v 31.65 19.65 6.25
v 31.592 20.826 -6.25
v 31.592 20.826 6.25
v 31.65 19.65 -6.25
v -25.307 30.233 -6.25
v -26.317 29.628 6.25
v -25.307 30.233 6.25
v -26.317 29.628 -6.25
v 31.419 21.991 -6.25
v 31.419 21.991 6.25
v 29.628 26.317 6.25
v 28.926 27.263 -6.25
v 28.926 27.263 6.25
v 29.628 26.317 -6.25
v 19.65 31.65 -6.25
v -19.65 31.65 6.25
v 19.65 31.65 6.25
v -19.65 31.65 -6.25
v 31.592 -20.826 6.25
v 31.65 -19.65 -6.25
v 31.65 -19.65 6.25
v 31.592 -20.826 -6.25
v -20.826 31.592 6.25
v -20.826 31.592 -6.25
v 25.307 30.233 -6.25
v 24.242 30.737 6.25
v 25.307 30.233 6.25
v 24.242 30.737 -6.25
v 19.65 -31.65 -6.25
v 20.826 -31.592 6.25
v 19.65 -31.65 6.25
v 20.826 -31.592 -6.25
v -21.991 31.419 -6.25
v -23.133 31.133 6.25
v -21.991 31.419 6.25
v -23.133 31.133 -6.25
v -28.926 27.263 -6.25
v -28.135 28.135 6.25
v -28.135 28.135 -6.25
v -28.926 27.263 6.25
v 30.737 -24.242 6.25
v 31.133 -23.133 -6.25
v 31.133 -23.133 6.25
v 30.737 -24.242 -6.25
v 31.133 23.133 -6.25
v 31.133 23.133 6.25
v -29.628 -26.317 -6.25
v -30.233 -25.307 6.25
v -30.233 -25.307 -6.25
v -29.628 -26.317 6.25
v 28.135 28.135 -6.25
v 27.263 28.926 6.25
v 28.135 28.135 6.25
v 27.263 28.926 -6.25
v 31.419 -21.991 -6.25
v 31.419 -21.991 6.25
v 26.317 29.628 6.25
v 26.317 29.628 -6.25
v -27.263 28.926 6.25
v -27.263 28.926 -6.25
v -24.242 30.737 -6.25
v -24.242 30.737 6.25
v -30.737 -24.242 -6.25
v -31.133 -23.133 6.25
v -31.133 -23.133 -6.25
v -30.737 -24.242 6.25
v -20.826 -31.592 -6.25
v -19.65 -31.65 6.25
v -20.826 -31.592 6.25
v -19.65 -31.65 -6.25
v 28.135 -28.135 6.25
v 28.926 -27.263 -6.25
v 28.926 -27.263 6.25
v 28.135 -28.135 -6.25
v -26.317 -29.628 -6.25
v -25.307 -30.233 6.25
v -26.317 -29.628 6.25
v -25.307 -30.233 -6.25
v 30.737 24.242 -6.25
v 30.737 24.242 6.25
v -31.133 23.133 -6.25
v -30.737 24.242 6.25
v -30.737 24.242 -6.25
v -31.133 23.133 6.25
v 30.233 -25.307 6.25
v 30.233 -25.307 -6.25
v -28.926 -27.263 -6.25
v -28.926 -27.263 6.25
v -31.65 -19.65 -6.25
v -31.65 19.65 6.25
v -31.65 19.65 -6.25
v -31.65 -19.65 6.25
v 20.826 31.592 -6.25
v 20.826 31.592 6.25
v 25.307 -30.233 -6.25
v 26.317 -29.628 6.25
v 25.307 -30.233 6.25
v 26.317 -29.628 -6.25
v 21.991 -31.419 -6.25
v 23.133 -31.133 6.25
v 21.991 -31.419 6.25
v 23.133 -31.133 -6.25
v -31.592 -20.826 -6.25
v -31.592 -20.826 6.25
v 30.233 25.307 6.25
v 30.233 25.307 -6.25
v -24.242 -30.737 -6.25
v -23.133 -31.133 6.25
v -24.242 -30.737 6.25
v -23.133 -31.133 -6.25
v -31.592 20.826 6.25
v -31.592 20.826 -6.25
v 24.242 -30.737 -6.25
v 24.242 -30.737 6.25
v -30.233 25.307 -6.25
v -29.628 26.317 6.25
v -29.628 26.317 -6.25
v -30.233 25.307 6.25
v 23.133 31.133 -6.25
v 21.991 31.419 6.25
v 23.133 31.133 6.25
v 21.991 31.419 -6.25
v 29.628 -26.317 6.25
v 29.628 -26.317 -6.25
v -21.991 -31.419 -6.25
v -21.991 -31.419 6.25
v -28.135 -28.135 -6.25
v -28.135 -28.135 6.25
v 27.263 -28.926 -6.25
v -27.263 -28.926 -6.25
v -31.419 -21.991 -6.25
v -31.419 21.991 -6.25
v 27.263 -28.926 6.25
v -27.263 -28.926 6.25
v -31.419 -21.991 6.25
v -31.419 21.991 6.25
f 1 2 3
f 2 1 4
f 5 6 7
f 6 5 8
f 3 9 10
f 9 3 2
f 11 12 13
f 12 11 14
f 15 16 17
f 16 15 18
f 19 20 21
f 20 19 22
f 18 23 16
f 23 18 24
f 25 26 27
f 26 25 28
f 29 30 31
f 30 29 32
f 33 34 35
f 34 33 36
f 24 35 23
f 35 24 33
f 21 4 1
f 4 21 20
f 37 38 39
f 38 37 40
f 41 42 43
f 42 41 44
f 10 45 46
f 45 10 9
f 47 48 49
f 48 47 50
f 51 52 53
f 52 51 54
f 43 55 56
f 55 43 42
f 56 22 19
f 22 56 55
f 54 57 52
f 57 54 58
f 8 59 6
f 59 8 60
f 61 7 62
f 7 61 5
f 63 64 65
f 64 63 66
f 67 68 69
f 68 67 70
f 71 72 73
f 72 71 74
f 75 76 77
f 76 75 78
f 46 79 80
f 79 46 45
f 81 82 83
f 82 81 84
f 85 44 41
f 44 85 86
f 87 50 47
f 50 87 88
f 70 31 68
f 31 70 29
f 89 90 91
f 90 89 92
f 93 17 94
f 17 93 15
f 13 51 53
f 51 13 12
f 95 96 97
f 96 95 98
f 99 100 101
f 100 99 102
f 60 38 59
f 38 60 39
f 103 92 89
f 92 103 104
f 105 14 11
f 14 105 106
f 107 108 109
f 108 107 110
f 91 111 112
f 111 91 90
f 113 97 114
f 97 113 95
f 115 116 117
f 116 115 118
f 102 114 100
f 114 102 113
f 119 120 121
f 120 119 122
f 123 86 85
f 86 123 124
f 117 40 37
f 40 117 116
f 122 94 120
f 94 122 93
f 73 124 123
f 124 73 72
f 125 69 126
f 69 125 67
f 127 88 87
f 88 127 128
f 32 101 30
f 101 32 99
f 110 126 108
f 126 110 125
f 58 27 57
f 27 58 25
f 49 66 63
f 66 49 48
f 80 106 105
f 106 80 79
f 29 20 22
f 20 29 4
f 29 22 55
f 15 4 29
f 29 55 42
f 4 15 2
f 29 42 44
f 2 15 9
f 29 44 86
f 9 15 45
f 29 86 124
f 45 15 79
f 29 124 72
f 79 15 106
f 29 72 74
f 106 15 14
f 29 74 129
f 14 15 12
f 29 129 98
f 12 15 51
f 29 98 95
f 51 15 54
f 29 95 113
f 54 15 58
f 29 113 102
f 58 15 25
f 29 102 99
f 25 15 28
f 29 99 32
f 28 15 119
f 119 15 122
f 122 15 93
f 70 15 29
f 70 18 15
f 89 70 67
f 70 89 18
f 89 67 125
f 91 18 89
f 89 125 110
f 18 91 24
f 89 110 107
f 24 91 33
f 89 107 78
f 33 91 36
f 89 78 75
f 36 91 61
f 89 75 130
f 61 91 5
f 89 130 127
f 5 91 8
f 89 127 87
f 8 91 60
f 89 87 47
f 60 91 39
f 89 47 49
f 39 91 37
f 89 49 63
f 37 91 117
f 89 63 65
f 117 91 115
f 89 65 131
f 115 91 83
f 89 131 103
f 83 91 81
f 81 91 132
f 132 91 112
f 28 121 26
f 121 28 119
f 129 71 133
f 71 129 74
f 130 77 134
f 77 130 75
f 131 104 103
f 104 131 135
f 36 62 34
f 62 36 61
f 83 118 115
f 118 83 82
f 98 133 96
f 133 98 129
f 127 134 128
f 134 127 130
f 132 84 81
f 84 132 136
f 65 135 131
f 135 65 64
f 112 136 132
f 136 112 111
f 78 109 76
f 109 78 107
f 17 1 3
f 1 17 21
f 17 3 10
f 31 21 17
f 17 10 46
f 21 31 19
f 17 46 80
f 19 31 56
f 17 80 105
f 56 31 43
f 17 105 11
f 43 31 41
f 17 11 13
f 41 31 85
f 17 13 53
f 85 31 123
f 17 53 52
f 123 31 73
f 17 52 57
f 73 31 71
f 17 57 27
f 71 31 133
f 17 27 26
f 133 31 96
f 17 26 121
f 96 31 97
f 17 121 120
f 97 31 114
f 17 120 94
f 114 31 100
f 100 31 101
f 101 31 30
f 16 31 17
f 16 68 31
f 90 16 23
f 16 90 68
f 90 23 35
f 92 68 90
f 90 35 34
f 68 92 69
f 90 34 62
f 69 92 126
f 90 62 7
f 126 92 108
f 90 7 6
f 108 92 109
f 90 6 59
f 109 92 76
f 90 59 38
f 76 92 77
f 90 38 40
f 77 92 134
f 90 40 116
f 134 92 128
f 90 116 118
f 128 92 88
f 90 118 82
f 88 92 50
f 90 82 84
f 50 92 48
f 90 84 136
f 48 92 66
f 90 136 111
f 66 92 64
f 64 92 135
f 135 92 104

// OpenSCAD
// GenericHolder1.0
// 
// A simple, generic insert for blocky things
// that are to fit inside other blocky things.
// 
// BrickHolder1 can do most of what this does, and more.
// Use that if you want TOGridPile-shaped blocks or something.

description = "";
size_atoms = [5, 5, 1];
atom_pitch = 12.7; // 0.001
cavity_size = [0, 0]; // 0.1
bottom_hole_size = [0,0]; // 0.2
floor_thickness = 3.2; // 0.1
front_slot_width = 0; // 0.1
outer_offset = -0.1;
$fn = 64;

use <../lib/TOGridLib3.scad>
use <../lib/TOGMod1.scad>
use <../lib/TOGPath1.scad>
use <../lib/TOGPolyhedronLib1.scad>
use <../lib/TOGArrayLib1.scad>
use <../lib/TOGVecLib0.scad>

size = [for(s=size_atoms) s * atom_pitch + outer_offset*2];

function brickholder2insert_volume( vec ) = tal1_reduce(1, vec, function(a,b) a*b);

togmod1_domodule(
let(height = size[2])
let(z_mid = 0)
let(crad = min(12, max((size[0]-cavity_size[0])/2, (size[1]-cavity_size[1])/2)))
let(hull = tphl1_make_rounded_cuboid(size, r=[crad,crad,0]))
let(cavity = brickholder2insert_volume(cavity_size) == 0 ? ["union"] :
	["translate", [0,0,height/2], tphl1_make_rounded_cuboid([cavity_size[0], cavity_size[1], (height-floor_thickness)*2], r=[1,1,0])])
let(bottom_hole =  brickholder2insert_volume(bottom_hole_size) == 0 ? ["union"] :
   tphl1_make_rounded_cuboid([bottom_hole_size[0], bottom_hole_size[1], height*2], r=[1,1,0]))
let(front_slot = front_slot_width == 0 ? ["union"] :
	["translate", [0,-(size[1]+bottom_hole_size[1])/4,0], tphl1_make_rounded_cuboid([front_slot_width, (size[1]-bottom_hole_size[1]), height*2], r=0)])
["difference",
	hull,
	cavity,
	bottom_hole,
	front_slot,
]);
